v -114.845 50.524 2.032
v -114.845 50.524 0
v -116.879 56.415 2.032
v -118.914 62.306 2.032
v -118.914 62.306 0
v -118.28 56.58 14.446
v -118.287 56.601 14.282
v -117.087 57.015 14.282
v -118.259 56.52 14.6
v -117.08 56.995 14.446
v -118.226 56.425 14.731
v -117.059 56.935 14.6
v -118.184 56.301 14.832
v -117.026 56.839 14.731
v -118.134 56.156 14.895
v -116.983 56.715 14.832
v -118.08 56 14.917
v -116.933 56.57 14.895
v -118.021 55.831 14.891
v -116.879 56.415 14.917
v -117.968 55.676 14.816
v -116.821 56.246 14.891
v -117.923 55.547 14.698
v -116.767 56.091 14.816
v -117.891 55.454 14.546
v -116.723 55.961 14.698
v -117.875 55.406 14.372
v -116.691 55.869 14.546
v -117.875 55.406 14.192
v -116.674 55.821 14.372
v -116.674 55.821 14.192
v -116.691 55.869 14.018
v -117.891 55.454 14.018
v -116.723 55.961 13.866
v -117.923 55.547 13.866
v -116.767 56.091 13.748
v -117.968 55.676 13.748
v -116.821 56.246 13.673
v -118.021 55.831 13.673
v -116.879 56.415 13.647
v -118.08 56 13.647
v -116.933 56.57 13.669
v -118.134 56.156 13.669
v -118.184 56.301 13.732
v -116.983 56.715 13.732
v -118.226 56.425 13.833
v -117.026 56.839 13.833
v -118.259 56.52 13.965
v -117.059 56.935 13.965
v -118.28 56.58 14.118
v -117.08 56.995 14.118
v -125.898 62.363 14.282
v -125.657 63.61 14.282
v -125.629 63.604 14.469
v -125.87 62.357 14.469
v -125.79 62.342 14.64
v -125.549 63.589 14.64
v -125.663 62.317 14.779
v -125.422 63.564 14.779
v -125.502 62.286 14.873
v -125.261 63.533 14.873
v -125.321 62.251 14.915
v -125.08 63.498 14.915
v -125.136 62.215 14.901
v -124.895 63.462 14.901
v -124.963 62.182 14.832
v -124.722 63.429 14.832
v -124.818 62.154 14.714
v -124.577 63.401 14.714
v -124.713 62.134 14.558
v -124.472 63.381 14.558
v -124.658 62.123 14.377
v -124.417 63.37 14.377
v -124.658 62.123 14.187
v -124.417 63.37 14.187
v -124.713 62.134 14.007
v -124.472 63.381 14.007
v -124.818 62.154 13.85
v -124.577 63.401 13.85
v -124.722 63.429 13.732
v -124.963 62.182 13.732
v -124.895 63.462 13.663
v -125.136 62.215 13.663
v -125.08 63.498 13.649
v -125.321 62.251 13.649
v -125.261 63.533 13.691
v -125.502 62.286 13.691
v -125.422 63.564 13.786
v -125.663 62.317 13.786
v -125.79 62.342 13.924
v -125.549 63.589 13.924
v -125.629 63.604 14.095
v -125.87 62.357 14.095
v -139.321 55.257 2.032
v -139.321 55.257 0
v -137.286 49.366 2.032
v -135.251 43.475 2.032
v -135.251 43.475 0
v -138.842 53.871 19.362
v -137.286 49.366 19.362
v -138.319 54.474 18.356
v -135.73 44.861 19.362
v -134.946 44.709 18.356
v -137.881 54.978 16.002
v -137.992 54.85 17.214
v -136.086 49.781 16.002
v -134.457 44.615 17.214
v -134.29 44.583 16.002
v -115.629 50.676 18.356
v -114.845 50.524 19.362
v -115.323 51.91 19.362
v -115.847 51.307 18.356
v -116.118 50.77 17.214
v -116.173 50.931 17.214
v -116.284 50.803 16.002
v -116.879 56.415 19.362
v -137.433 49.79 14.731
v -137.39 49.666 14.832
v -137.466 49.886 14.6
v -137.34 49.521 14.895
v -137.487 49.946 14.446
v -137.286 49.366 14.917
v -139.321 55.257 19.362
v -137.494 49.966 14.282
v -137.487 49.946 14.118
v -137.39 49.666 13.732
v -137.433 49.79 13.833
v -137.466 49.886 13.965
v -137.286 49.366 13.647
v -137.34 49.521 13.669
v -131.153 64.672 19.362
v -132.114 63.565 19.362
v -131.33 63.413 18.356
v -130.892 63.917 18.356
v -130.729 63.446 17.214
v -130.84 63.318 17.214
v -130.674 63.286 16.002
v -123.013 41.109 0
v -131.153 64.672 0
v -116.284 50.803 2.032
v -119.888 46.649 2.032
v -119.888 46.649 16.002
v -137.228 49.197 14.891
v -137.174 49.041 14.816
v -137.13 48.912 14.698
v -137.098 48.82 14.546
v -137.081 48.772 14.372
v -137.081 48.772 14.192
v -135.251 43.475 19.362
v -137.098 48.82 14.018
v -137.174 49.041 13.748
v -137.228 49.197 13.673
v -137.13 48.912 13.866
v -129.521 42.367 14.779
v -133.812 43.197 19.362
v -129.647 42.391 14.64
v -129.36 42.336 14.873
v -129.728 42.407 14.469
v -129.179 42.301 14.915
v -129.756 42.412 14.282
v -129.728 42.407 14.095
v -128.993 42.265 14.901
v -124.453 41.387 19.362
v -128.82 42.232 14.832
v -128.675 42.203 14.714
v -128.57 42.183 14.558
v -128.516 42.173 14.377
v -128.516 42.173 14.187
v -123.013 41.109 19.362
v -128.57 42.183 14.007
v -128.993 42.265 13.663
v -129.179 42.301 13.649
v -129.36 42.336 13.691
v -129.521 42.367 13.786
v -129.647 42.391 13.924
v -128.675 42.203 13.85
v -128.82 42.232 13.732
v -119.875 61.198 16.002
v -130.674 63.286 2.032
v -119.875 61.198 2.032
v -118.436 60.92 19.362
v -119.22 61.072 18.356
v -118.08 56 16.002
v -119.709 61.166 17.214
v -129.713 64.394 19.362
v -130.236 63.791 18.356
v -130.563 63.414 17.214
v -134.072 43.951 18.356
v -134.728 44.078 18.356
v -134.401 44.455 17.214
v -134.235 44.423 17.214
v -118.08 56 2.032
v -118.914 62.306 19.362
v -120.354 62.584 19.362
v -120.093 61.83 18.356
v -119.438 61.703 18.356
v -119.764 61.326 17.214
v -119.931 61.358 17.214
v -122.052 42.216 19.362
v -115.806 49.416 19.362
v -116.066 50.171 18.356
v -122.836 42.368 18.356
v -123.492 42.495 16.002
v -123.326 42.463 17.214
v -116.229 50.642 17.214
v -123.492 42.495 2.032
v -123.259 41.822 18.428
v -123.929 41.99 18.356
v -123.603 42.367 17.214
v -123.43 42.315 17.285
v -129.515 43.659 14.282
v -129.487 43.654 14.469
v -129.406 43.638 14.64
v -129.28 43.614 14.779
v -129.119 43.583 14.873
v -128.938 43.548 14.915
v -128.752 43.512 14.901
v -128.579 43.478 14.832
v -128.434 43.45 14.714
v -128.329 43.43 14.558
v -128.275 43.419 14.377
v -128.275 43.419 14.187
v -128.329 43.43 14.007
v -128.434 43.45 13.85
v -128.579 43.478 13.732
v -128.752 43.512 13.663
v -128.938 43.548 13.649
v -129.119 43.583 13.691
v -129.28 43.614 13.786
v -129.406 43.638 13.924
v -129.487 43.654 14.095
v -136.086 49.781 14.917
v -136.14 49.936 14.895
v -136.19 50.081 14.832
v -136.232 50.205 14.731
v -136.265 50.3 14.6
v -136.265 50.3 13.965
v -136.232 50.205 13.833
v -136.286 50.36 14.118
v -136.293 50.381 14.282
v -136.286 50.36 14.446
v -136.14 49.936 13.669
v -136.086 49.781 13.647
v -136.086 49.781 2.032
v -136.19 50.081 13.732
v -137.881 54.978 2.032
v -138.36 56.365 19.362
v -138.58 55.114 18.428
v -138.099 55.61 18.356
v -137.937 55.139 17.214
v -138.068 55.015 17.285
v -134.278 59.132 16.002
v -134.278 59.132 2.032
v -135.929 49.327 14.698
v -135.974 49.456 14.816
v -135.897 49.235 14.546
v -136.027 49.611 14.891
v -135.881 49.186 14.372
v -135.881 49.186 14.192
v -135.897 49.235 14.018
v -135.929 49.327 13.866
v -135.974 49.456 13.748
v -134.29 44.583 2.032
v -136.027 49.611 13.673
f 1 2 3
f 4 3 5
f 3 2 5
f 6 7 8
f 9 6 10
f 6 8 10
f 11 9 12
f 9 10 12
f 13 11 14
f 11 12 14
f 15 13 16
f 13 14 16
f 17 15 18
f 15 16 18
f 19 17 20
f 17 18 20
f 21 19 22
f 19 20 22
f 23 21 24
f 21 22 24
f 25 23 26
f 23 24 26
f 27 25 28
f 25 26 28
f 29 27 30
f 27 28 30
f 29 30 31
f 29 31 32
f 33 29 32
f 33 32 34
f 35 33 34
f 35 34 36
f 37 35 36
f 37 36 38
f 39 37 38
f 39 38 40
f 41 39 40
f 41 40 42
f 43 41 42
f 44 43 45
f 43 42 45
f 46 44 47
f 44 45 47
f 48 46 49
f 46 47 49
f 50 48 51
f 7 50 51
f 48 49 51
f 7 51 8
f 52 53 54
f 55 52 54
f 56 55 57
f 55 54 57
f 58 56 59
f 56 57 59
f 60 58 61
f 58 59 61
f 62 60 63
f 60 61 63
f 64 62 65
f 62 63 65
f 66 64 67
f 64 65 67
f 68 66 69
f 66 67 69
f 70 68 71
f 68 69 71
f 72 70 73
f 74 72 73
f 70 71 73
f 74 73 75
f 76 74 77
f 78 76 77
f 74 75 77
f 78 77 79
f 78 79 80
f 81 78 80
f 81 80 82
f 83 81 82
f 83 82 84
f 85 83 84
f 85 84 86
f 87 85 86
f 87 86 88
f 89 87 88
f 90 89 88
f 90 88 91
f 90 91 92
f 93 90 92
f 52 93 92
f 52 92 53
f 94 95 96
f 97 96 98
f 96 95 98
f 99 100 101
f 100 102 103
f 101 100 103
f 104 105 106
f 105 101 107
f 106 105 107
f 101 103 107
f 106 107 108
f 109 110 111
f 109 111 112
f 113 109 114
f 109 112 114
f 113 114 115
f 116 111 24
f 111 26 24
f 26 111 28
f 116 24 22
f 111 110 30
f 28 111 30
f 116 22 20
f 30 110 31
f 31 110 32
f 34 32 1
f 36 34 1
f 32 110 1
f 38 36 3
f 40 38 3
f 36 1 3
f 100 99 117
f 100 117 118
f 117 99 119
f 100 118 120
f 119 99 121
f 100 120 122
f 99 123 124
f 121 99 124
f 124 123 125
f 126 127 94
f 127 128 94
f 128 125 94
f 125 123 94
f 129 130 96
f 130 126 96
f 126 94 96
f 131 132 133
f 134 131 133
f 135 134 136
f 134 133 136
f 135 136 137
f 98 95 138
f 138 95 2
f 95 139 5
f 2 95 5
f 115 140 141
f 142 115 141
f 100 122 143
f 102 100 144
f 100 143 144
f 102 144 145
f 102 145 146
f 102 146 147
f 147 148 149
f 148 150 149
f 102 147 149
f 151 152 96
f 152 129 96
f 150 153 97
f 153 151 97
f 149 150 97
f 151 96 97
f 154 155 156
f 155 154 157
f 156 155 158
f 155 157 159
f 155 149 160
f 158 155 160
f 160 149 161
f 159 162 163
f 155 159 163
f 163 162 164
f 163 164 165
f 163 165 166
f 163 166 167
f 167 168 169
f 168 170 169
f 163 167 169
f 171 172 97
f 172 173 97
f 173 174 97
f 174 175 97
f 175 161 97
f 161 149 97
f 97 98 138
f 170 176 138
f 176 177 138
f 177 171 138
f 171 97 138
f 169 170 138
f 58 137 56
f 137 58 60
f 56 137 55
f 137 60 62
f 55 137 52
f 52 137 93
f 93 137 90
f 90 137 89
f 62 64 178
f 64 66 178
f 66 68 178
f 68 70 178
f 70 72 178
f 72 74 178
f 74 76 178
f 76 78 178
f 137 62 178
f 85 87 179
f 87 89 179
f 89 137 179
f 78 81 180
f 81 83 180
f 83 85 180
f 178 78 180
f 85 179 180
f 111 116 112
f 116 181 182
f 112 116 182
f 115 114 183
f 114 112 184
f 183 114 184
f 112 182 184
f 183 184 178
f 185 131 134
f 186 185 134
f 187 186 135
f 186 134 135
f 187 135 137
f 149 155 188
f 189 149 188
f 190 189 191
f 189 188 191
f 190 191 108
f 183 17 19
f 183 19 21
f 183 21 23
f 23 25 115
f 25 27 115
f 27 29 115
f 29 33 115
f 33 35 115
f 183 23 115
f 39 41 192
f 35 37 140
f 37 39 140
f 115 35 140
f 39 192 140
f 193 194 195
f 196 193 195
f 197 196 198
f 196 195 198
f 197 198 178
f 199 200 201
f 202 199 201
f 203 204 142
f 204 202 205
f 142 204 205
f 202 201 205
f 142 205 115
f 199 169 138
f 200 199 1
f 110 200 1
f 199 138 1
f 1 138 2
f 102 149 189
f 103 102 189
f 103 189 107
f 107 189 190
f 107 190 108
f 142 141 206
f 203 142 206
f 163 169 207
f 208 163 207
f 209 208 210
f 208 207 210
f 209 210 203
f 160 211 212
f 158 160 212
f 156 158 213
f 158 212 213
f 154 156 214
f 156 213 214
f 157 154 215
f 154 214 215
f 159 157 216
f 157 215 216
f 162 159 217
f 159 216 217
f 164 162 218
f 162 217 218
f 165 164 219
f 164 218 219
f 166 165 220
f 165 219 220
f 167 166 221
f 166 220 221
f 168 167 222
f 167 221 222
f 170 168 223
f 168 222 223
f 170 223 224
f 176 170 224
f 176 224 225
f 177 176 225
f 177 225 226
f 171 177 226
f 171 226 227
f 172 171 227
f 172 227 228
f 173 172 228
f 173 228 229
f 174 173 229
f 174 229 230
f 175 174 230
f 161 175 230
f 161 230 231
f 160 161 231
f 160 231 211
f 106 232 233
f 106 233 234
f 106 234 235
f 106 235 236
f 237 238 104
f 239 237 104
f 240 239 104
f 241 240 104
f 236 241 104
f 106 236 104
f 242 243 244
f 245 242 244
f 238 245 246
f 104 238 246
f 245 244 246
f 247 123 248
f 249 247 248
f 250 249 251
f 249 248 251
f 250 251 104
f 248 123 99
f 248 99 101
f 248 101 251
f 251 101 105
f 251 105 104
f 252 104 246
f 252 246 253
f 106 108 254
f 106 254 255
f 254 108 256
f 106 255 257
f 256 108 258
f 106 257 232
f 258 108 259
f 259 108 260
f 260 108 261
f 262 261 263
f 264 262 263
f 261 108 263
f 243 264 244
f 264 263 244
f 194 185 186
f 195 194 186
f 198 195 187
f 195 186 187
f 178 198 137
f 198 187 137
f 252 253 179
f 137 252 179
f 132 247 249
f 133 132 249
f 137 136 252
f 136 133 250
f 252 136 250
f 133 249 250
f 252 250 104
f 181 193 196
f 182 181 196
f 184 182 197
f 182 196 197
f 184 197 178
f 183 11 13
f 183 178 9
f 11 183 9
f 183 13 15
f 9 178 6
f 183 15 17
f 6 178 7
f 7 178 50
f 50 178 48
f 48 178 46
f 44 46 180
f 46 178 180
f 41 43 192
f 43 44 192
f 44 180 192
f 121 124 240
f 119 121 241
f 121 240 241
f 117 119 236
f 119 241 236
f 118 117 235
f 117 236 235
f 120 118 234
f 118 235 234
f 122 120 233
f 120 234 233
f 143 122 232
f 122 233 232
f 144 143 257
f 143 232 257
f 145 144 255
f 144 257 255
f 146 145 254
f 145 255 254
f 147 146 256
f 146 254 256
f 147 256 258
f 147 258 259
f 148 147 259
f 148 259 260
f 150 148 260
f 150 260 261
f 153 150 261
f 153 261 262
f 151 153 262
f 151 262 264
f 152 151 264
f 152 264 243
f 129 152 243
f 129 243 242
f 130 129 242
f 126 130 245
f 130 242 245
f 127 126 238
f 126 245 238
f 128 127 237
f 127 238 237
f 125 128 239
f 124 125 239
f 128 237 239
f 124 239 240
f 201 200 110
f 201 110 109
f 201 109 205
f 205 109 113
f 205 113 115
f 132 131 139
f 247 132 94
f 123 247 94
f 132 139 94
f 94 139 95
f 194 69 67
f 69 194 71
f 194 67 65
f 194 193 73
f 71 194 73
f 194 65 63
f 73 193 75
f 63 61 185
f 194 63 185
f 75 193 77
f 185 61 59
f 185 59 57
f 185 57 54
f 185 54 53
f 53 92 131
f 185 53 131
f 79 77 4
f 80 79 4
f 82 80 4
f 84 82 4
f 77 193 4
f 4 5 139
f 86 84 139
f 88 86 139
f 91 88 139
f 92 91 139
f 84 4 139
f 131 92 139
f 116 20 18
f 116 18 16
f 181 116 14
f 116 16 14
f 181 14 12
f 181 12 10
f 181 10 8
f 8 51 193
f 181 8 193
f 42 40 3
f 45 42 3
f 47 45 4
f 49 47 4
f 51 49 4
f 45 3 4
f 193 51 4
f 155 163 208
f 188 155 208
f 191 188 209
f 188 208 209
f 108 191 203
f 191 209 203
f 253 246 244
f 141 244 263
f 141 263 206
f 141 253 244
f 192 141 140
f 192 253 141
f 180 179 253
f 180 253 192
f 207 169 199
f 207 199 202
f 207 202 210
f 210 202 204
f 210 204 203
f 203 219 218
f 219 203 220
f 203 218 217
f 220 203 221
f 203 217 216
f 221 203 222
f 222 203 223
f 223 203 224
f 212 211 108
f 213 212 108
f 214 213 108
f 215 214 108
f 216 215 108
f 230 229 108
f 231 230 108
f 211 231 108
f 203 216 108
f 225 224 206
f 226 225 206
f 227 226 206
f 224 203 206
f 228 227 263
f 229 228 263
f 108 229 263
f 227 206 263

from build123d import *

# Parameters (mm, degrees)
F1_DEPTH      = 2.032
F3_DEPTH      = 19.05
F4_T4_DEPTH   = 36.3985226281
F4_T10_DEPTH  = 36.3985226281
F4_T16_DEPTH  = 36.3985226281
F4_T22_DEPTH  = 36.3985226281
F4_T28_DEPTH  = 36.3985226281
F4_T34_DEPTH  = 36.3985226281
F4_T41_DEPTH  = 36.3985226281
F4_T47_DEPTH  = 36.3985226281
F4_T56_DEPTH  = 36.3985226281
F4_T62_DEPTH  = 36.3985226281
F4_T71_DEPTH  = 36.3985226281
F4_T77_DEPTH  = 36.3985226281
F4_T86_DEPTH  = 36.3985226281
F4_T92_DEPTH  = 36.3985226281
F4_T101_DEPTH = 36.3985226281
F4_T107_DEPTH = 36.3985226281
F4_T116_DEPTH = 36.3985226281
F4_T122_DEPTH = 36.3985226281
F6_R          = 0.635
F7_DEPTH      = 25.4
F5_R          = 0.635
F8_DEPTH      = 25.4


# Not quite as in the source:
# - a fillet or chamfer that OpenCascade refuses, or shapes differently, is made with other operations: its cross-section is extruded or revolved along the edge and cut away or added


with BuildPart() as f1:
    # F0 (on Top) → F1 (new body)
    with BuildSketch(Plane.XY):
        Polygon((-123.0130245504, 41.1086249019), (-114.844562537, 50.5241579017), (-118.9144222983, 62.306020015), (-131.1527440729, 64.6723491286), (-139.3212060863, 55.2568161288), (-135.2513463251, 43.4749540155), align=None)
    extrude(amount=F1_DEPTH)

    # F2 (on face) → F3 (join)
    with BuildSketch(Plane.XY.offset(2.032)):
        Polygon((-131.1527440729, 64.6723491286), (-135.2369750796, 59.9645826287), (-134.2776702834, 59.1323360859), (-130.6739370422, 63.2862477035), (-119.8754178293, 61.1983102503), (-118.079891464, 56.0004299062), (-116.8794924177, 56.4150889583), (-118.9144222983, 62.306020015), align=None)
        Polygon((-134.2776702834, 59.1323360859), (-135.2369750796, 59.9645826287), (-139.3212060863, 55.2568161288), (-137.2862762057, 49.3658850722), (-136.0858771593, 49.7805441243), (-137.8814035246, 54.9784244684), align=None)
        Polygon((-136.0858771593, 49.7805441243), (-137.2862762057, 49.3658850722), (-135.2513463251, 43.4749540155), (-123.0130245504, 41.1086249019), (-118.9287935437, 45.8163914018), (-119.88809834, 46.6486379446), (-123.4918315812, 42.494726327), (-134.2903507941, 44.5826637802), align=None)
        Polygon((-116.2843650988, 50.8025495621), (-119.88809834, 46.6486379446), (-118.9287935437, 45.8163914018), (-114.844562537, 50.5241579017), (-116.8794924177, 56.4150889583), (-118.079891464, 56.0004299062), align=None)
    extrude(amount=F3_DEPTH)

    # F4: fillet of radius 5.08 on 6 edges, made by hand


with BuildPart() as f4_tool2:
    # F4_s3 → F4_t4 (new body)
    with BuildSketch(Plane(origin=(-40.3193780899, -46.4748975157, 0), x_dir=(0, 0, 1), z_dir=(0.6553122384, 0.7553581073, 0))):
        with BuildLine():
            ThreePointArc((21.082, -145.2578703952), (19.5941024484, -141.6657679468), (16.002, -140.1778703952))
            Line((16.002, -140.1778703952), (21.082, -140.1778703952))
            Line((21.082, -140.1778703952), (21.082, -145.2578703952))
        make_face()
    extrude(amount=F4_T4_DEPTH)

    split(bisect_by=Plane(origin=(7.0863744403, 36.6497331747, 0), x_dir=(0, 0, 1), z_dir=(-0.1898379922, -0.981815429, 0)), keep=Keep.TOP)

    split(bisect_by=Plane(origin=(-106.215781989, -36.6905785323, 0), x_dir=(0, 0, 1), z_dir=(0.9451960995, 0.3265031907, 0)), keep=Keep.TOP)


with BuildPart() as f1_1:
    add(f1.part)

    # F4_t1: cut F4_tool2
    add(f4_tool2.part, mode=Mode.SUBTRACT)


with BuildPart() as f4_tool8:
    # F4_s9 → F4_t10 (new body)
    with BuildSketch(Plane(origin=(-150.2293674314, 29.0474570301, 0), x_dir=(0, 0, 1), z_dir=(0.981815429, -0.1898379922, 0))):
        with BuildLine():
            ThreePointArc((21.082, -42.4085365971), (19.5941024484, -38.8164341487), (16.002, -37.3285365971))
            Line((16.002, -37.3285365971), (21.082, -37.3285365971))
            Line((21.082, -37.3285365971), (21.082, -42.4085365971))
        make_face()
    extrude(amount=F4_T10_DEPTH)

    split(bisect_by=Plane(origin=(-88.2097962936, -30.4706927504, 0), x_dir=(0, 0, 1), z_dir=(-0.9451960995, -0.3265031907, 0)), keep=Keep.TOP)

    split(bisect_by=Plane(origin=(-105.8844908623, 91.8602740219, 0), x_dir=(0, 0, 1), z_dir=(0.7553581073, -0.6553122384, 0)), keep=Keep.TOP)


with BuildPart() as f1_2:
    add(f1_1.part)

    # F4_t7: cut F4_tool8
    add(f4_tool8.part, mode=Mode.SUBTRACT)


with BuildPart() as f4_tool14:
    # F4_s15 → F4_t16 (new body)
    with BuildSketch(Plane(origin=(-35.8122120569, 103.6729934642, 0), x_dir=(0, 0, 1), z_dir=(0.3265031907, -0.9451960995, 0))):
        with BuildLine():
            ThreePointArc((21.082, 88.2443337981), (19.5941024484, 91.8364362465), (16.002, 93.3243337981))
            Line((16.002, 93.3243337981), (21.082, 93.3243337981))
            Line((21.082, 93.3243337981), (21.082, 88.2443337981))
        make_face()
    extrude(amount=F4_T16_DEPTH)

    split(bisect_by=Plane(origin=(-91.4949189189, 79.3765758805, 0), x_dir=(0, 0, 1), z_dir=(-0.7553581073, 0.6553122384, 0)), keep=Keep.TOP)

    split(bisect_by=Plane(origin=(7.0863744403, 36.6497331747, 0), x_dir=(0, 0, 1), z_dir=(-0.1898379922, -0.981815429, 0)), keep=Keep.TOP)


with BuildPart() as f1_3:
    add(f1_2.part)

    # F4_t13: cut F4_tool14
    add(f4_tool14.part, mode=Mode.SUBTRACT)


with BuildPart() as f4_tool20:
    # F4_s21 → F4_t22 (new body)
    with BuildSketch(Plane(origin=(-16.4669807523, -18.9809783561, 0), x_dir=(0, 0, 1), z_dir=(-0.6553122384, -0.7553581073, 0))):
        with BuildLine():
            ThreePointArc((21.082, 116.0478703952), (19.5941024484, 119.6399728436), (16.002, 121.1278703952))
            Line((16.002, 121.1278703952), (21.082, 121.1278703952))
            Line((21.082, 121.1278703952), (21.082, 116.0478703952))
        make_face()
    extrude(amount=F4_T22_DEPTH)

    split(bisect_by=Plane(origin=(-88.2097962936, -30.4706927504, 0), x_dir=(0, 0, 1), z_dir=(-0.9451960995, -0.3265031907, 0)), keep=Keep.TOP)

    split(bisect_by=Plane(origin=(3.4699606884, 17.9461492514, 0), x_dir=(0, 0, 1), z_dir=(0.1898379922, 0.981815429, 0)), keep=Keep.TOP)


with BuildPart() as f1_4:
    add(f1_3.part)

    # F4_t19: cut F4_tool20
    add(f4_tool20.part, mode=Mode.SUBTRACT)


with BuildPart() as f4_tool26:
    # F4_s27 → F4_t28 (new body)
    with BuildSketch(Plane(origin=(-114.4927363208, 22.1376345743, 0), x_dir=(0, 0, 1), z_dir=(-0.981815429, 0.1898379922, 0))):
        with BuildLine():
            ThreePointArc((21.082, 13.1985365971), (19.5941024484, 16.7906390456), (16.002, 18.2785365971))
            Line((16.002, 18.2785365971), (21.082, 18.2785365971))
            Line((21.082, 18.2785365971), (21.082, 13.1985365971))
        make_face()
    extrude(amount=F4_T28_DEPTH)

    split(bisect_by=Plane(origin=(-91.4949189189, 79.3765758805, 0), x_dir=(0, 0, 1), z_dir=(-0.7553581073, 0.6553122384, 0)), keep=Keep.TOP)

    split(bisect_by=Plane(origin=(-106.215781989, -36.6905785323, 0), x_dir=(0, 0, 1), z_dir=(0.9451960995, 0.3265031907, 0)), keep=Keep.TOP)


with BuildPart() as f1_5:
    add(f1_4.part)

    # F4_t25: cut F4_tool26
    add(f4_tool26.part, mode=Mode.SUBTRACT)


with BuildPart() as f4_tool32:
    # F4_s33 → F4_t34 (new body)
    with BuildSketch(Plane(origin=(-23.9279782839, 69.2692518489, 0), x_dir=(0, 0, 1), z_dir=(-0.3265031907, 0.9451960995, 0))):
        with BuildLine():
            ThreePointArc((21.082, -117.4543337981), (19.5941024484, -113.8622313496), (16.002, -112.3743337981))
            Line((16.002, -112.3743337981), (21.082, -112.3743337981))
            Line((21.082, -112.3743337981), (21.082, -117.4543337981))
        make_face()
    extrude(amount=F4_T34_DEPTH)

    split(bisect_by=Plane(origin=(-105.8844908623, 91.8602740219, 0), x_dir=(0, 0, 1), z_dir=(0.7553581073, -0.6553122384, 0)), keep=Keep.TOP)

    split(bisect_by=Plane(origin=(3.4699606884, 17.9461492514, 0), x_dir=(0, 0, 1), z_dir=(0.1898379922, 0.981815429, 0)), keep=Keep.TOP)


with BuildPart() as f1_6:
    add(f1_5.part)

    # F4_t31: cut F4_tool32
    add(f4_tool32.part, mode=Mode.SUBTRACT)


with BuildPart() as f4_tool39:
    # F4_s40 → F4_t41 (new body)
    with BuildSketch(Plane(origin=(-23.9279782839, 69.2692518489, 0), x_dir=(0, 0, 1), z_dir=(-0.3265031907, 0.9451960995, 0))):
        with BuildLine():
            ThreePointArc((21.082, -117.4543337981), (19.5941024484, -113.8622313496), (16.002, -112.3743337981))
            Line((16.002, -112.3743337981), (21.082, -112.3743337981))
            Line((21.082, -112.3743337981), (21.082, -117.4543337981))
        make_face()
    extrude(amount=F4_T41_DEPTH)

    split(bisect_by=Plane(origin=(-106.8437956585, 92.6925205646, 0), x_dir=(0, 0, 1), z_dir=(0.7553581073, -0.6553122384, 0)), keep=Keep.TOP)

    split(bisect_by=Plane(origin=(-105.8844908623, 91.8602740219, 0), x_dir=(0, 0, 1), z_dir=(-0.7553581073, 0.6553122384, 0)), keep=Keep.TOP)

    split(bisect_by=Plane(origin=(-107.4161810353, -37.1052375844, 0), x_dir=(0, 0, 1), z_dir=(0.9451960995, 0.3265031907, 0)), keep=Keep.TOP)


with BuildPart() as f4_tool45:
    # F4_s46 → F4_t47 (new body)
    with BuildSketch(Plane(origin=(-40.3193780899, -46.4748975157, 0), x_dir=(0, 0, 1), z_dir=(0.6553122384, 0.7553581073, 0))):
        with BuildLine():
            ThreePointArc((21.082, -145.2578703952), (19.5941024484, -141.6657679468), (16.002, -140.1778703952))
            Line((16.002, -140.1778703952), (21.082, -140.1778703952))
            Line((21.082, -140.1778703952), (21.082, -145.2578703952))
        make_face()
    extrude(amount=F4_T47_DEPTH)

    split(bisect_by=Plane(origin=(-106.8437956585, 92.6925205646, 0), x_dir=(0, 0, 1), z_dir=(0.7553581073, -0.6553122384, 0)), keep=Keep.TOP)

    split(bisect_by=Plane(origin=(-106.215781989, -36.6905785323, 0), x_dir=(0, 0, 1), z_dir=(-0.9451960995, -0.3265031907, 0)), keep=Keep.TOP)

    split(bisect_by=Plane(origin=(-107.4161810353, -37.1052375844, 0), x_dir=(0, 0, 1), z_dir=(0.9451960995, 0.3265031907, 0)), keep=Keep.TOP)


with BuildPart() as f4_tool39_1:
    add(f4_tool39.part)

    # F4_t51: intersect F4_tool45
    add(f4_tool45.part, mode=Mode.INTERSECT)


with BuildPart() as f1_7:
    add(f1_6.part)

    # F4_t37: cut F4_tool39
    add(f4_tool39_1.part, mode=Mode.SUBTRACT)


with BuildPart() as f4_tool54:
    # F4_s55 → F4_t56 (new body)
    with BuildSketch(Plane(origin=(-40.3193780899, -46.4748975157, 0), x_dir=(0, 0, 1), z_dir=(0.6553122384, 0.7553581073, 0))):
        with BuildLine():
            ThreePointArc((21.082, -145.2578703952), (19.5941024484, -141.6657679468), (16.002, -140.1778703952))
            Line((16.002, -140.1778703952), (21.082, -140.1778703952))
            Line((21.082, -140.1778703952), (21.082, -145.2578703952))
        make_face()
    extrude(amount=F4_T56_DEPTH)

    split(bisect_by=Plane(origin=(-106.8437956585, 92.6925205646, 0), x_dir=(0, 0, 1), z_dir=(0.7553581073, -0.6553122384, 0)), keep=Keep.TOP)

    split(bisect_by=Plane(origin=(7.3274686905, 37.8966387696, 0), x_dir=(0, 0, 1), z_dir=(-0.1898379922, -0.981815429, 0)), keep=Keep.TOP)

    split(bisect_by=Plane(origin=(7.0863744403, 36.6497331747, 0), x_dir=(0, 0, 1), z_dir=(0.1898379922, 0.981815429, 0)), keep=Keep.TOP)


with BuildPart() as f4_tool60:
    # F4_s61 → F4_t62 (new body)
    with BuildSketch(Plane(origin=(-150.2293674314, 29.0474570301, 0), x_dir=(0, 0, 1), z_dir=(0.981815429, -0.1898379922, 0))):
        with BuildLine():
            ThreePointArc((21.082, -42.4085365971), (19.5941024484, -38.8164341487), (16.002, -37.3285365971))
            Line((16.002, -37.3285365971), (21.082, -37.3285365971))
            Line((21.082, -37.3285365971), (21.082, -42.4085365971))
        make_face()
    extrude(amount=F4_T62_DEPTH)

    split(bisect_by=Plane(origin=(-106.8437956585, 92.6925205646, 0), x_dir=(0, 0, 1), z_dir=(0.7553581073, -0.6553122384, 0)), keep=Keep.TOP)

    split(bisect_by=Plane(origin=(7.3274686905, 37.8966387696, 0), x_dir=(0, 0, 1), z_dir=(-0.1898379922, -0.981815429, 0)), keep=Keep.TOP)

    split(bisect_by=Plane(origin=(-105.8844908623, 91.8602740219, 0), x_dir=(0, 0, 1), z_dir=(-0.7553581073, 0.6553122384, 0)), keep=Keep.TOP)


with BuildPart() as f4_tool54_1:
    add(f4_tool54.part)

    # F4_t66: intersect F4_tool60
    add(f4_tool60.part, mode=Mode.INTERSECT)


with BuildPart() as f1_8:
    add(f1_7.part)

    # F4_t52: cut F4_tool54
    add(f4_tool54_1.part, mode=Mode.SUBTRACT)


with BuildPart() as f4_tool69:
    # F4_s70 → F4_t71 (new body)
    with BuildSketch(Plane(origin=(-150.2293674314, 29.0474570301, 0), x_dir=(0, 0, 1), z_dir=(0.981815429, -0.1898379922, 0))):
        with BuildLine():
            ThreePointArc((21.082, -42.4085365971), (19.5941024484, -38.8164341487), (16.002, -37.3285365971))
            Line((16.002, -37.3285365971), (21.082, -37.3285365971))
            Line((21.082, -37.3285365971), (21.082, -42.4085365971))
        make_face()
    extrude(amount=F4_T71_DEPTH)

    split(bisect_by=Plane(origin=(7.3274686905, 37.8966387696, 0), x_dir=(0, 0, 1), z_dir=(-0.1898379922, -0.981815429, 0)), keep=Keep.TOP)

    split(bisect_by=Plane(origin=(-87.0093972473, -30.0560336983, 0), x_dir=(0, 0, 1), z_dir=(-0.9451960995, -0.3265031907, 0)), keep=Keep.TOP)

    split(bisect_by=Plane(origin=(-88.2097962936, -30.4706927504, 0), x_dir=(0, 0, 1), z_dir=(0.9451960995, 0.3265031907, 0)), keep=Keep.TOP)


with BuildPart() as f4_tool75:
    # F4_s76 → F4_t77 (new body)
    with BuildSketch(Plane(origin=(-35.8122120569, 103.6729934642, 0), x_dir=(0, 0, 1), z_dir=(0.3265031907, -0.9451960995, 0))):
        with BuildLine():
            ThreePointArc((21.082, 88.2443337981), (19.5941024484, 91.8364362465), (16.002, 93.3243337981))
            Line((16.002, 93.3243337981), (21.082, 93.3243337981))
            Line((21.082, 93.3243337981), (21.082, 88.2443337981))
        make_face()
    extrude(amount=F4_T77_DEPTH)

    split(bisect_by=Plane(origin=(7.3274686905, 37.8966387696, 0), x_dir=(0, 0, 1), z_dir=(-0.1898379922, -0.981815429, 0)), keep=Keep.TOP)

    split(bisect_by=Plane(origin=(-87.0093972473, -30.0560336983, 0), x_dir=(0, 0, 1), z_dir=(-0.9451960995, -0.3265031907, 0)), keep=Keep.TOP)

    split(bisect_by=Plane(origin=(7.0863744403, 36.6497331747, 0), x_dir=(0, 0, 1), z_dir=(0.1898379922, 0.981815429, 0)), keep=Keep.TOP)


with BuildPart() as f4_tool69_1:
    add(f4_tool69.part)

    # F4_t81: intersect F4_tool75
    add(f4_tool75.part, mode=Mode.INTERSECT)


with BuildPart() as f1_9:
    add(f1_8.part)

    # F4_t67: cut F4_tool69
    add(f4_tool69_1.part, mode=Mode.SUBTRACT)


with BuildPart() as f4_tool84:
    # F4_s85 → F4_t86 (new body)
    with BuildSketch(Plane(origin=(-35.8122120569, 103.6729934642, 0), x_dir=(0, 0, 1), z_dir=(0.3265031907, -0.9451960995, 0))):
        with BuildLine():
            ThreePointArc((21.082, 88.2443337981), (19.5941024484, 91.8364362465), (16.002, 93.3243337981))
            Line((16.002, 93.3243337981), (21.082, 93.3243337981))
            Line((21.082, 93.3243337981), (21.082, 88.2443337981))
        make_face()
    extrude(amount=F4_T86_DEPTH)

    split(bisect_by=Plane(origin=(-87.0093972473, -30.0560336983, 0), x_dir=(0, 0, 1), z_dir=(-0.9451960995, -0.3265031907, 0)), keep=Keep.TOP)

    split(bisect_by=Plane(origin=(-90.5356141227, 78.5443293377, 0), x_dir=(0, 0, 1), z_dir=(-0.7553581073, 0.6553122384, 0)), keep=Keep.TOP)

    split(bisect_by=Plane(origin=(-91.4949189189, 79.3765758805, 0), x_dir=(0, 0, 1), z_dir=(0.7553581073, -0.6553122384, 0)), keep=Keep.TOP)


with BuildPart() as f4_tool90:
    # F4_s91 → F4_t92 (new body)
    with BuildSketch(Plane(origin=(-16.4669807523, -18.9809783561, 0), x_dir=(0, 0, 1), z_dir=(-0.6553122384, -0.7553581073, 0))):
        with BuildLine():
            ThreePointArc((21.082, 116.0478703952), (19.5941024484, 119.6399728436), (16.002, 121.1278703952))
            Line((16.002, 121.1278703952), (21.082, 121.1278703952))
            Line((21.082, 121.1278703952), (21.082, 116.0478703952))
        make_face()
    extrude(amount=F4_T92_DEPTH)

    split(bisect_by=Plane(origin=(-87.0093972473, -30.0560336983, 0), x_dir=(0, 0, 1), z_dir=(-0.9451960995, -0.3265031907, 0)), keep=Keep.TOP)

    split(bisect_by=Plane(origin=(-90.5356141227, 78.5443293377, 0), x_dir=(0, 0, 1), z_dir=(-0.7553581073, 0.6553122384, 0)), keep=Keep.TOP)

    split(bisect_by=Plane(origin=(-88.2097962936, -30.4706927504, 0), x_dir=(0, 0, 1), z_dir=(0.9451960995, 0.3265031907, 0)), keep=Keep.TOP)


with BuildPart() as f4_tool84_1:
    add(f4_tool84.part)

    # F4_t96: intersect F4_tool90
    add(f4_tool90.part, mode=Mode.INTERSECT)


with BuildPart() as f1_10:
    add(f1_9.part)

    # F4_t82: cut F4_tool84
    add(f4_tool84_1.part, mode=Mode.SUBTRACT)


with BuildPart() as f4_tool99:
    # F4_s100 → F4_t101 (new body)
    with BuildSketch(Plane(origin=(-114.4927363208, 22.1376345743, 0), x_dir=(0, 0, 1), z_dir=(-0.981815429, 0.1898379922, 0))):
        with BuildLine():
            ThreePointArc((21.082, 13.1985365971), (19.5941024484, 16.7906390456), (16.002, 18.2785365971))
            Line((16.002, 18.2785365971), (21.082, 18.2785365971))
            Line((21.082, 18.2785365971), (21.082, 13.1985365971))
        make_face()
    extrude(amount=F4_T101_DEPTH)

    split(bisect_by=Plane(origin=(3.2288664383, 16.6992436565, 0), x_dir=(0, 0, 1), z_dir=(0.1898379922, 0.981815429, 0)), keep=Keep.TOP)

    split(bisect_by=Plane(origin=(-90.5356141227, 78.5443293377, 0), x_dir=(0, 0, 1), z_dir=(-0.7553581073, 0.6553122384, 0)), keep=Keep.TOP)

    split(bisect_by=Plane(origin=(-91.4949189189, 79.3765758805, 0), x_dir=(0, 0, 1), z_dir=(0.7553581073, -0.6553122384, 0)), keep=Keep.TOP)


with BuildPart() as f4_tool105:
    # F4_s106 → F4_t107 (new body)
    with BuildSketch(Plane(origin=(-16.4669807523, -18.9809783561, 0), x_dir=(0, 0, 1), z_dir=(-0.6553122384, -0.7553581073, 0))):
        with BuildLine():
            ThreePointArc((21.082, 116.0478703952), (19.5941024484, 119.6399728436), (16.002, 121.1278703952))
            Line((16.002, 121.1278703952), (21.082, 121.1278703952))
            Line((21.082, 121.1278703952), (21.082, 116.0478703952))
        make_face()
    extrude(amount=F4_T107_DEPTH)

    split(bisect_by=Plane(origin=(3.2288664383, 16.6992436565, 0), x_dir=(0, 0, 1), z_dir=(0.1898379922, 0.981815429, 0)), keep=Keep.TOP)

    split(bisect_by=Plane(origin=(-90.5356141227, 78.5443293377, 0), x_dir=(0, 0, 1), z_dir=(-0.7553581073, 0.6553122384, 0)), keep=Keep.TOP)

    split(bisect_by=Plane(origin=(3.4699606884, 17.9461492514, 0), x_dir=(0, 0, 1), z_dir=(-0.1898379922, -0.981815429, 0)), keep=Keep.TOP)


with BuildPart() as f4_tool99_1:
    add(f4_tool99.part)

    # F4_t111: intersect F4_tool105
    add(f4_tool105.part, mode=Mode.INTERSECT)


with BuildPart() as f1_11:
    add(f1_10.part)

    # F4_t97: cut F4_tool99
    add(f4_tool99_1.part, mode=Mode.SUBTRACT)


with BuildPart() as f4_tool114:
    # F4_s115 → F4_t116 (new body)
    with BuildSketch(Plane(origin=(-114.4927363208, 22.1376345743, 0), x_dir=(0, 0, 1), z_dir=(-0.981815429, 0.1898379922, 0))):
        with BuildLine():
            ThreePointArc((21.082, 13.1985365971), (19.5941024484, 16.7906390456), (16.002, 18.2785365971))
            Line((16.002, 18.2785365971), (21.082, 18.2785365971))
            Line((21.082, 18.2785365971), (21.082, 13.1985365971))
        make_face()
    extrude(amount=F4_T116_DEPTH)

    split(bisect_by=Plane(origin=(3.2288664383, 16.6992436565, 0), x_dir=(0, 0, 1), z_dir=(0.1898379922, 0.981815429, 0)), keep=Keep.TOP)

    split(bisect_by=Plane(origin=(-106.215781989, -36.6905785323, 0), x_dir=(0, 0, 1), z_dir=(-0.9451960995, -0.3265031907, 0)), keep=Keep.TOP)

    split(bisect_by=Plane(origin=(-107.4161810353, -37.1052375844, 0), x_dir=(0, 0, 1), z_dir=(0.9451960995, 0.3265031907, 0)), keep=Keep.TOP)


with BuildPart() as f4_tool120:
    # F4_s121 → F4_t122 (new body)
    with BuildSketch(Plane(origin=(-23.9279782839, 69.2692518489, 0), x_dir=(0, 0, 1), z_dir=(-0.3265031907, 0.9451960995, 0))):
        with BuildLine():
            ThreePointArc((21.082, -117.4543337981), (19.5941024484, -113.8622313496), (16.002, -112.3743337981))
            Line((16.002, -112.3743337981), (21.082, -112.3743337981))
            Line((21.082, -112.3743337981), (21.082, -117.4543337981))
        make_face()
    extrude(amount=F4_T122_DEPTH)

    split(bisect_by=Plane(origin=(3.2288664383, 16.6992436565, 0), x_dir=(0, 0, 1), z_dir=(0.1898379922, 0.981815429, 0)), keep=Keep.TOP)

    split(bisect_by=Plane(origin=(3.4699606884, 17.9461492514, 0), x_dir=(0, 0, 1), z_dir=(-0.1898379922, -0.981815429, 0)), keep=Keep.TOP)

    split(bisect_by=Plane(origin=(-107.4161810353, -37.1052375844, 0), x_dir=(0, 0, 1), z_dir=(0.9451960995, 0.3265031907, 0)), keep=Keep.TOP)


with BuildPart() as f4_tool114_1:
    add(f4_tool114.part)

    # F4_t126: intersect F4_tool120
    add(f4_tool120.part, mode=Mode.INTERSECT)


with BuildPart() as f1_12:
    add(f1_11.part)

    # F4_t112: cut F4_tool114
    add(f4_tool114_1.part, mode=Mode.SUBTRACT)

    # F6 (on face) → F7 (cut)
    with BuildSketch(Plane(origin=(7.3274686905, 37.8966387696, 0), x_dir=(-0.981815429, 0.1898379922, 0), z_dir=(0.1898379922, 0.981815429, 0))):
        with Locations((134.8125604474, 14.2821041651)):
            Circle(F6_R)
    extrude(amount=-F7_DEPTH, mode=Mode.SUBTRACT)

    # F5 (on face) → F8 (cut)
    with BuildSketch(Plane(origin=(-87.0093972473, -30.0560336983, 0), x_dir=(-0.3265031907, 0.9451960995, 0), z_dir=(0.9451960995, 0.3265031907, 0))):
        with Locations((91.4848492319, 14.2821041651)):
            Circle(F5_R)
    extrude(amount=-F8_DEPTH, mode=Mode.SUBTRACT)


solid = f1_12.part
